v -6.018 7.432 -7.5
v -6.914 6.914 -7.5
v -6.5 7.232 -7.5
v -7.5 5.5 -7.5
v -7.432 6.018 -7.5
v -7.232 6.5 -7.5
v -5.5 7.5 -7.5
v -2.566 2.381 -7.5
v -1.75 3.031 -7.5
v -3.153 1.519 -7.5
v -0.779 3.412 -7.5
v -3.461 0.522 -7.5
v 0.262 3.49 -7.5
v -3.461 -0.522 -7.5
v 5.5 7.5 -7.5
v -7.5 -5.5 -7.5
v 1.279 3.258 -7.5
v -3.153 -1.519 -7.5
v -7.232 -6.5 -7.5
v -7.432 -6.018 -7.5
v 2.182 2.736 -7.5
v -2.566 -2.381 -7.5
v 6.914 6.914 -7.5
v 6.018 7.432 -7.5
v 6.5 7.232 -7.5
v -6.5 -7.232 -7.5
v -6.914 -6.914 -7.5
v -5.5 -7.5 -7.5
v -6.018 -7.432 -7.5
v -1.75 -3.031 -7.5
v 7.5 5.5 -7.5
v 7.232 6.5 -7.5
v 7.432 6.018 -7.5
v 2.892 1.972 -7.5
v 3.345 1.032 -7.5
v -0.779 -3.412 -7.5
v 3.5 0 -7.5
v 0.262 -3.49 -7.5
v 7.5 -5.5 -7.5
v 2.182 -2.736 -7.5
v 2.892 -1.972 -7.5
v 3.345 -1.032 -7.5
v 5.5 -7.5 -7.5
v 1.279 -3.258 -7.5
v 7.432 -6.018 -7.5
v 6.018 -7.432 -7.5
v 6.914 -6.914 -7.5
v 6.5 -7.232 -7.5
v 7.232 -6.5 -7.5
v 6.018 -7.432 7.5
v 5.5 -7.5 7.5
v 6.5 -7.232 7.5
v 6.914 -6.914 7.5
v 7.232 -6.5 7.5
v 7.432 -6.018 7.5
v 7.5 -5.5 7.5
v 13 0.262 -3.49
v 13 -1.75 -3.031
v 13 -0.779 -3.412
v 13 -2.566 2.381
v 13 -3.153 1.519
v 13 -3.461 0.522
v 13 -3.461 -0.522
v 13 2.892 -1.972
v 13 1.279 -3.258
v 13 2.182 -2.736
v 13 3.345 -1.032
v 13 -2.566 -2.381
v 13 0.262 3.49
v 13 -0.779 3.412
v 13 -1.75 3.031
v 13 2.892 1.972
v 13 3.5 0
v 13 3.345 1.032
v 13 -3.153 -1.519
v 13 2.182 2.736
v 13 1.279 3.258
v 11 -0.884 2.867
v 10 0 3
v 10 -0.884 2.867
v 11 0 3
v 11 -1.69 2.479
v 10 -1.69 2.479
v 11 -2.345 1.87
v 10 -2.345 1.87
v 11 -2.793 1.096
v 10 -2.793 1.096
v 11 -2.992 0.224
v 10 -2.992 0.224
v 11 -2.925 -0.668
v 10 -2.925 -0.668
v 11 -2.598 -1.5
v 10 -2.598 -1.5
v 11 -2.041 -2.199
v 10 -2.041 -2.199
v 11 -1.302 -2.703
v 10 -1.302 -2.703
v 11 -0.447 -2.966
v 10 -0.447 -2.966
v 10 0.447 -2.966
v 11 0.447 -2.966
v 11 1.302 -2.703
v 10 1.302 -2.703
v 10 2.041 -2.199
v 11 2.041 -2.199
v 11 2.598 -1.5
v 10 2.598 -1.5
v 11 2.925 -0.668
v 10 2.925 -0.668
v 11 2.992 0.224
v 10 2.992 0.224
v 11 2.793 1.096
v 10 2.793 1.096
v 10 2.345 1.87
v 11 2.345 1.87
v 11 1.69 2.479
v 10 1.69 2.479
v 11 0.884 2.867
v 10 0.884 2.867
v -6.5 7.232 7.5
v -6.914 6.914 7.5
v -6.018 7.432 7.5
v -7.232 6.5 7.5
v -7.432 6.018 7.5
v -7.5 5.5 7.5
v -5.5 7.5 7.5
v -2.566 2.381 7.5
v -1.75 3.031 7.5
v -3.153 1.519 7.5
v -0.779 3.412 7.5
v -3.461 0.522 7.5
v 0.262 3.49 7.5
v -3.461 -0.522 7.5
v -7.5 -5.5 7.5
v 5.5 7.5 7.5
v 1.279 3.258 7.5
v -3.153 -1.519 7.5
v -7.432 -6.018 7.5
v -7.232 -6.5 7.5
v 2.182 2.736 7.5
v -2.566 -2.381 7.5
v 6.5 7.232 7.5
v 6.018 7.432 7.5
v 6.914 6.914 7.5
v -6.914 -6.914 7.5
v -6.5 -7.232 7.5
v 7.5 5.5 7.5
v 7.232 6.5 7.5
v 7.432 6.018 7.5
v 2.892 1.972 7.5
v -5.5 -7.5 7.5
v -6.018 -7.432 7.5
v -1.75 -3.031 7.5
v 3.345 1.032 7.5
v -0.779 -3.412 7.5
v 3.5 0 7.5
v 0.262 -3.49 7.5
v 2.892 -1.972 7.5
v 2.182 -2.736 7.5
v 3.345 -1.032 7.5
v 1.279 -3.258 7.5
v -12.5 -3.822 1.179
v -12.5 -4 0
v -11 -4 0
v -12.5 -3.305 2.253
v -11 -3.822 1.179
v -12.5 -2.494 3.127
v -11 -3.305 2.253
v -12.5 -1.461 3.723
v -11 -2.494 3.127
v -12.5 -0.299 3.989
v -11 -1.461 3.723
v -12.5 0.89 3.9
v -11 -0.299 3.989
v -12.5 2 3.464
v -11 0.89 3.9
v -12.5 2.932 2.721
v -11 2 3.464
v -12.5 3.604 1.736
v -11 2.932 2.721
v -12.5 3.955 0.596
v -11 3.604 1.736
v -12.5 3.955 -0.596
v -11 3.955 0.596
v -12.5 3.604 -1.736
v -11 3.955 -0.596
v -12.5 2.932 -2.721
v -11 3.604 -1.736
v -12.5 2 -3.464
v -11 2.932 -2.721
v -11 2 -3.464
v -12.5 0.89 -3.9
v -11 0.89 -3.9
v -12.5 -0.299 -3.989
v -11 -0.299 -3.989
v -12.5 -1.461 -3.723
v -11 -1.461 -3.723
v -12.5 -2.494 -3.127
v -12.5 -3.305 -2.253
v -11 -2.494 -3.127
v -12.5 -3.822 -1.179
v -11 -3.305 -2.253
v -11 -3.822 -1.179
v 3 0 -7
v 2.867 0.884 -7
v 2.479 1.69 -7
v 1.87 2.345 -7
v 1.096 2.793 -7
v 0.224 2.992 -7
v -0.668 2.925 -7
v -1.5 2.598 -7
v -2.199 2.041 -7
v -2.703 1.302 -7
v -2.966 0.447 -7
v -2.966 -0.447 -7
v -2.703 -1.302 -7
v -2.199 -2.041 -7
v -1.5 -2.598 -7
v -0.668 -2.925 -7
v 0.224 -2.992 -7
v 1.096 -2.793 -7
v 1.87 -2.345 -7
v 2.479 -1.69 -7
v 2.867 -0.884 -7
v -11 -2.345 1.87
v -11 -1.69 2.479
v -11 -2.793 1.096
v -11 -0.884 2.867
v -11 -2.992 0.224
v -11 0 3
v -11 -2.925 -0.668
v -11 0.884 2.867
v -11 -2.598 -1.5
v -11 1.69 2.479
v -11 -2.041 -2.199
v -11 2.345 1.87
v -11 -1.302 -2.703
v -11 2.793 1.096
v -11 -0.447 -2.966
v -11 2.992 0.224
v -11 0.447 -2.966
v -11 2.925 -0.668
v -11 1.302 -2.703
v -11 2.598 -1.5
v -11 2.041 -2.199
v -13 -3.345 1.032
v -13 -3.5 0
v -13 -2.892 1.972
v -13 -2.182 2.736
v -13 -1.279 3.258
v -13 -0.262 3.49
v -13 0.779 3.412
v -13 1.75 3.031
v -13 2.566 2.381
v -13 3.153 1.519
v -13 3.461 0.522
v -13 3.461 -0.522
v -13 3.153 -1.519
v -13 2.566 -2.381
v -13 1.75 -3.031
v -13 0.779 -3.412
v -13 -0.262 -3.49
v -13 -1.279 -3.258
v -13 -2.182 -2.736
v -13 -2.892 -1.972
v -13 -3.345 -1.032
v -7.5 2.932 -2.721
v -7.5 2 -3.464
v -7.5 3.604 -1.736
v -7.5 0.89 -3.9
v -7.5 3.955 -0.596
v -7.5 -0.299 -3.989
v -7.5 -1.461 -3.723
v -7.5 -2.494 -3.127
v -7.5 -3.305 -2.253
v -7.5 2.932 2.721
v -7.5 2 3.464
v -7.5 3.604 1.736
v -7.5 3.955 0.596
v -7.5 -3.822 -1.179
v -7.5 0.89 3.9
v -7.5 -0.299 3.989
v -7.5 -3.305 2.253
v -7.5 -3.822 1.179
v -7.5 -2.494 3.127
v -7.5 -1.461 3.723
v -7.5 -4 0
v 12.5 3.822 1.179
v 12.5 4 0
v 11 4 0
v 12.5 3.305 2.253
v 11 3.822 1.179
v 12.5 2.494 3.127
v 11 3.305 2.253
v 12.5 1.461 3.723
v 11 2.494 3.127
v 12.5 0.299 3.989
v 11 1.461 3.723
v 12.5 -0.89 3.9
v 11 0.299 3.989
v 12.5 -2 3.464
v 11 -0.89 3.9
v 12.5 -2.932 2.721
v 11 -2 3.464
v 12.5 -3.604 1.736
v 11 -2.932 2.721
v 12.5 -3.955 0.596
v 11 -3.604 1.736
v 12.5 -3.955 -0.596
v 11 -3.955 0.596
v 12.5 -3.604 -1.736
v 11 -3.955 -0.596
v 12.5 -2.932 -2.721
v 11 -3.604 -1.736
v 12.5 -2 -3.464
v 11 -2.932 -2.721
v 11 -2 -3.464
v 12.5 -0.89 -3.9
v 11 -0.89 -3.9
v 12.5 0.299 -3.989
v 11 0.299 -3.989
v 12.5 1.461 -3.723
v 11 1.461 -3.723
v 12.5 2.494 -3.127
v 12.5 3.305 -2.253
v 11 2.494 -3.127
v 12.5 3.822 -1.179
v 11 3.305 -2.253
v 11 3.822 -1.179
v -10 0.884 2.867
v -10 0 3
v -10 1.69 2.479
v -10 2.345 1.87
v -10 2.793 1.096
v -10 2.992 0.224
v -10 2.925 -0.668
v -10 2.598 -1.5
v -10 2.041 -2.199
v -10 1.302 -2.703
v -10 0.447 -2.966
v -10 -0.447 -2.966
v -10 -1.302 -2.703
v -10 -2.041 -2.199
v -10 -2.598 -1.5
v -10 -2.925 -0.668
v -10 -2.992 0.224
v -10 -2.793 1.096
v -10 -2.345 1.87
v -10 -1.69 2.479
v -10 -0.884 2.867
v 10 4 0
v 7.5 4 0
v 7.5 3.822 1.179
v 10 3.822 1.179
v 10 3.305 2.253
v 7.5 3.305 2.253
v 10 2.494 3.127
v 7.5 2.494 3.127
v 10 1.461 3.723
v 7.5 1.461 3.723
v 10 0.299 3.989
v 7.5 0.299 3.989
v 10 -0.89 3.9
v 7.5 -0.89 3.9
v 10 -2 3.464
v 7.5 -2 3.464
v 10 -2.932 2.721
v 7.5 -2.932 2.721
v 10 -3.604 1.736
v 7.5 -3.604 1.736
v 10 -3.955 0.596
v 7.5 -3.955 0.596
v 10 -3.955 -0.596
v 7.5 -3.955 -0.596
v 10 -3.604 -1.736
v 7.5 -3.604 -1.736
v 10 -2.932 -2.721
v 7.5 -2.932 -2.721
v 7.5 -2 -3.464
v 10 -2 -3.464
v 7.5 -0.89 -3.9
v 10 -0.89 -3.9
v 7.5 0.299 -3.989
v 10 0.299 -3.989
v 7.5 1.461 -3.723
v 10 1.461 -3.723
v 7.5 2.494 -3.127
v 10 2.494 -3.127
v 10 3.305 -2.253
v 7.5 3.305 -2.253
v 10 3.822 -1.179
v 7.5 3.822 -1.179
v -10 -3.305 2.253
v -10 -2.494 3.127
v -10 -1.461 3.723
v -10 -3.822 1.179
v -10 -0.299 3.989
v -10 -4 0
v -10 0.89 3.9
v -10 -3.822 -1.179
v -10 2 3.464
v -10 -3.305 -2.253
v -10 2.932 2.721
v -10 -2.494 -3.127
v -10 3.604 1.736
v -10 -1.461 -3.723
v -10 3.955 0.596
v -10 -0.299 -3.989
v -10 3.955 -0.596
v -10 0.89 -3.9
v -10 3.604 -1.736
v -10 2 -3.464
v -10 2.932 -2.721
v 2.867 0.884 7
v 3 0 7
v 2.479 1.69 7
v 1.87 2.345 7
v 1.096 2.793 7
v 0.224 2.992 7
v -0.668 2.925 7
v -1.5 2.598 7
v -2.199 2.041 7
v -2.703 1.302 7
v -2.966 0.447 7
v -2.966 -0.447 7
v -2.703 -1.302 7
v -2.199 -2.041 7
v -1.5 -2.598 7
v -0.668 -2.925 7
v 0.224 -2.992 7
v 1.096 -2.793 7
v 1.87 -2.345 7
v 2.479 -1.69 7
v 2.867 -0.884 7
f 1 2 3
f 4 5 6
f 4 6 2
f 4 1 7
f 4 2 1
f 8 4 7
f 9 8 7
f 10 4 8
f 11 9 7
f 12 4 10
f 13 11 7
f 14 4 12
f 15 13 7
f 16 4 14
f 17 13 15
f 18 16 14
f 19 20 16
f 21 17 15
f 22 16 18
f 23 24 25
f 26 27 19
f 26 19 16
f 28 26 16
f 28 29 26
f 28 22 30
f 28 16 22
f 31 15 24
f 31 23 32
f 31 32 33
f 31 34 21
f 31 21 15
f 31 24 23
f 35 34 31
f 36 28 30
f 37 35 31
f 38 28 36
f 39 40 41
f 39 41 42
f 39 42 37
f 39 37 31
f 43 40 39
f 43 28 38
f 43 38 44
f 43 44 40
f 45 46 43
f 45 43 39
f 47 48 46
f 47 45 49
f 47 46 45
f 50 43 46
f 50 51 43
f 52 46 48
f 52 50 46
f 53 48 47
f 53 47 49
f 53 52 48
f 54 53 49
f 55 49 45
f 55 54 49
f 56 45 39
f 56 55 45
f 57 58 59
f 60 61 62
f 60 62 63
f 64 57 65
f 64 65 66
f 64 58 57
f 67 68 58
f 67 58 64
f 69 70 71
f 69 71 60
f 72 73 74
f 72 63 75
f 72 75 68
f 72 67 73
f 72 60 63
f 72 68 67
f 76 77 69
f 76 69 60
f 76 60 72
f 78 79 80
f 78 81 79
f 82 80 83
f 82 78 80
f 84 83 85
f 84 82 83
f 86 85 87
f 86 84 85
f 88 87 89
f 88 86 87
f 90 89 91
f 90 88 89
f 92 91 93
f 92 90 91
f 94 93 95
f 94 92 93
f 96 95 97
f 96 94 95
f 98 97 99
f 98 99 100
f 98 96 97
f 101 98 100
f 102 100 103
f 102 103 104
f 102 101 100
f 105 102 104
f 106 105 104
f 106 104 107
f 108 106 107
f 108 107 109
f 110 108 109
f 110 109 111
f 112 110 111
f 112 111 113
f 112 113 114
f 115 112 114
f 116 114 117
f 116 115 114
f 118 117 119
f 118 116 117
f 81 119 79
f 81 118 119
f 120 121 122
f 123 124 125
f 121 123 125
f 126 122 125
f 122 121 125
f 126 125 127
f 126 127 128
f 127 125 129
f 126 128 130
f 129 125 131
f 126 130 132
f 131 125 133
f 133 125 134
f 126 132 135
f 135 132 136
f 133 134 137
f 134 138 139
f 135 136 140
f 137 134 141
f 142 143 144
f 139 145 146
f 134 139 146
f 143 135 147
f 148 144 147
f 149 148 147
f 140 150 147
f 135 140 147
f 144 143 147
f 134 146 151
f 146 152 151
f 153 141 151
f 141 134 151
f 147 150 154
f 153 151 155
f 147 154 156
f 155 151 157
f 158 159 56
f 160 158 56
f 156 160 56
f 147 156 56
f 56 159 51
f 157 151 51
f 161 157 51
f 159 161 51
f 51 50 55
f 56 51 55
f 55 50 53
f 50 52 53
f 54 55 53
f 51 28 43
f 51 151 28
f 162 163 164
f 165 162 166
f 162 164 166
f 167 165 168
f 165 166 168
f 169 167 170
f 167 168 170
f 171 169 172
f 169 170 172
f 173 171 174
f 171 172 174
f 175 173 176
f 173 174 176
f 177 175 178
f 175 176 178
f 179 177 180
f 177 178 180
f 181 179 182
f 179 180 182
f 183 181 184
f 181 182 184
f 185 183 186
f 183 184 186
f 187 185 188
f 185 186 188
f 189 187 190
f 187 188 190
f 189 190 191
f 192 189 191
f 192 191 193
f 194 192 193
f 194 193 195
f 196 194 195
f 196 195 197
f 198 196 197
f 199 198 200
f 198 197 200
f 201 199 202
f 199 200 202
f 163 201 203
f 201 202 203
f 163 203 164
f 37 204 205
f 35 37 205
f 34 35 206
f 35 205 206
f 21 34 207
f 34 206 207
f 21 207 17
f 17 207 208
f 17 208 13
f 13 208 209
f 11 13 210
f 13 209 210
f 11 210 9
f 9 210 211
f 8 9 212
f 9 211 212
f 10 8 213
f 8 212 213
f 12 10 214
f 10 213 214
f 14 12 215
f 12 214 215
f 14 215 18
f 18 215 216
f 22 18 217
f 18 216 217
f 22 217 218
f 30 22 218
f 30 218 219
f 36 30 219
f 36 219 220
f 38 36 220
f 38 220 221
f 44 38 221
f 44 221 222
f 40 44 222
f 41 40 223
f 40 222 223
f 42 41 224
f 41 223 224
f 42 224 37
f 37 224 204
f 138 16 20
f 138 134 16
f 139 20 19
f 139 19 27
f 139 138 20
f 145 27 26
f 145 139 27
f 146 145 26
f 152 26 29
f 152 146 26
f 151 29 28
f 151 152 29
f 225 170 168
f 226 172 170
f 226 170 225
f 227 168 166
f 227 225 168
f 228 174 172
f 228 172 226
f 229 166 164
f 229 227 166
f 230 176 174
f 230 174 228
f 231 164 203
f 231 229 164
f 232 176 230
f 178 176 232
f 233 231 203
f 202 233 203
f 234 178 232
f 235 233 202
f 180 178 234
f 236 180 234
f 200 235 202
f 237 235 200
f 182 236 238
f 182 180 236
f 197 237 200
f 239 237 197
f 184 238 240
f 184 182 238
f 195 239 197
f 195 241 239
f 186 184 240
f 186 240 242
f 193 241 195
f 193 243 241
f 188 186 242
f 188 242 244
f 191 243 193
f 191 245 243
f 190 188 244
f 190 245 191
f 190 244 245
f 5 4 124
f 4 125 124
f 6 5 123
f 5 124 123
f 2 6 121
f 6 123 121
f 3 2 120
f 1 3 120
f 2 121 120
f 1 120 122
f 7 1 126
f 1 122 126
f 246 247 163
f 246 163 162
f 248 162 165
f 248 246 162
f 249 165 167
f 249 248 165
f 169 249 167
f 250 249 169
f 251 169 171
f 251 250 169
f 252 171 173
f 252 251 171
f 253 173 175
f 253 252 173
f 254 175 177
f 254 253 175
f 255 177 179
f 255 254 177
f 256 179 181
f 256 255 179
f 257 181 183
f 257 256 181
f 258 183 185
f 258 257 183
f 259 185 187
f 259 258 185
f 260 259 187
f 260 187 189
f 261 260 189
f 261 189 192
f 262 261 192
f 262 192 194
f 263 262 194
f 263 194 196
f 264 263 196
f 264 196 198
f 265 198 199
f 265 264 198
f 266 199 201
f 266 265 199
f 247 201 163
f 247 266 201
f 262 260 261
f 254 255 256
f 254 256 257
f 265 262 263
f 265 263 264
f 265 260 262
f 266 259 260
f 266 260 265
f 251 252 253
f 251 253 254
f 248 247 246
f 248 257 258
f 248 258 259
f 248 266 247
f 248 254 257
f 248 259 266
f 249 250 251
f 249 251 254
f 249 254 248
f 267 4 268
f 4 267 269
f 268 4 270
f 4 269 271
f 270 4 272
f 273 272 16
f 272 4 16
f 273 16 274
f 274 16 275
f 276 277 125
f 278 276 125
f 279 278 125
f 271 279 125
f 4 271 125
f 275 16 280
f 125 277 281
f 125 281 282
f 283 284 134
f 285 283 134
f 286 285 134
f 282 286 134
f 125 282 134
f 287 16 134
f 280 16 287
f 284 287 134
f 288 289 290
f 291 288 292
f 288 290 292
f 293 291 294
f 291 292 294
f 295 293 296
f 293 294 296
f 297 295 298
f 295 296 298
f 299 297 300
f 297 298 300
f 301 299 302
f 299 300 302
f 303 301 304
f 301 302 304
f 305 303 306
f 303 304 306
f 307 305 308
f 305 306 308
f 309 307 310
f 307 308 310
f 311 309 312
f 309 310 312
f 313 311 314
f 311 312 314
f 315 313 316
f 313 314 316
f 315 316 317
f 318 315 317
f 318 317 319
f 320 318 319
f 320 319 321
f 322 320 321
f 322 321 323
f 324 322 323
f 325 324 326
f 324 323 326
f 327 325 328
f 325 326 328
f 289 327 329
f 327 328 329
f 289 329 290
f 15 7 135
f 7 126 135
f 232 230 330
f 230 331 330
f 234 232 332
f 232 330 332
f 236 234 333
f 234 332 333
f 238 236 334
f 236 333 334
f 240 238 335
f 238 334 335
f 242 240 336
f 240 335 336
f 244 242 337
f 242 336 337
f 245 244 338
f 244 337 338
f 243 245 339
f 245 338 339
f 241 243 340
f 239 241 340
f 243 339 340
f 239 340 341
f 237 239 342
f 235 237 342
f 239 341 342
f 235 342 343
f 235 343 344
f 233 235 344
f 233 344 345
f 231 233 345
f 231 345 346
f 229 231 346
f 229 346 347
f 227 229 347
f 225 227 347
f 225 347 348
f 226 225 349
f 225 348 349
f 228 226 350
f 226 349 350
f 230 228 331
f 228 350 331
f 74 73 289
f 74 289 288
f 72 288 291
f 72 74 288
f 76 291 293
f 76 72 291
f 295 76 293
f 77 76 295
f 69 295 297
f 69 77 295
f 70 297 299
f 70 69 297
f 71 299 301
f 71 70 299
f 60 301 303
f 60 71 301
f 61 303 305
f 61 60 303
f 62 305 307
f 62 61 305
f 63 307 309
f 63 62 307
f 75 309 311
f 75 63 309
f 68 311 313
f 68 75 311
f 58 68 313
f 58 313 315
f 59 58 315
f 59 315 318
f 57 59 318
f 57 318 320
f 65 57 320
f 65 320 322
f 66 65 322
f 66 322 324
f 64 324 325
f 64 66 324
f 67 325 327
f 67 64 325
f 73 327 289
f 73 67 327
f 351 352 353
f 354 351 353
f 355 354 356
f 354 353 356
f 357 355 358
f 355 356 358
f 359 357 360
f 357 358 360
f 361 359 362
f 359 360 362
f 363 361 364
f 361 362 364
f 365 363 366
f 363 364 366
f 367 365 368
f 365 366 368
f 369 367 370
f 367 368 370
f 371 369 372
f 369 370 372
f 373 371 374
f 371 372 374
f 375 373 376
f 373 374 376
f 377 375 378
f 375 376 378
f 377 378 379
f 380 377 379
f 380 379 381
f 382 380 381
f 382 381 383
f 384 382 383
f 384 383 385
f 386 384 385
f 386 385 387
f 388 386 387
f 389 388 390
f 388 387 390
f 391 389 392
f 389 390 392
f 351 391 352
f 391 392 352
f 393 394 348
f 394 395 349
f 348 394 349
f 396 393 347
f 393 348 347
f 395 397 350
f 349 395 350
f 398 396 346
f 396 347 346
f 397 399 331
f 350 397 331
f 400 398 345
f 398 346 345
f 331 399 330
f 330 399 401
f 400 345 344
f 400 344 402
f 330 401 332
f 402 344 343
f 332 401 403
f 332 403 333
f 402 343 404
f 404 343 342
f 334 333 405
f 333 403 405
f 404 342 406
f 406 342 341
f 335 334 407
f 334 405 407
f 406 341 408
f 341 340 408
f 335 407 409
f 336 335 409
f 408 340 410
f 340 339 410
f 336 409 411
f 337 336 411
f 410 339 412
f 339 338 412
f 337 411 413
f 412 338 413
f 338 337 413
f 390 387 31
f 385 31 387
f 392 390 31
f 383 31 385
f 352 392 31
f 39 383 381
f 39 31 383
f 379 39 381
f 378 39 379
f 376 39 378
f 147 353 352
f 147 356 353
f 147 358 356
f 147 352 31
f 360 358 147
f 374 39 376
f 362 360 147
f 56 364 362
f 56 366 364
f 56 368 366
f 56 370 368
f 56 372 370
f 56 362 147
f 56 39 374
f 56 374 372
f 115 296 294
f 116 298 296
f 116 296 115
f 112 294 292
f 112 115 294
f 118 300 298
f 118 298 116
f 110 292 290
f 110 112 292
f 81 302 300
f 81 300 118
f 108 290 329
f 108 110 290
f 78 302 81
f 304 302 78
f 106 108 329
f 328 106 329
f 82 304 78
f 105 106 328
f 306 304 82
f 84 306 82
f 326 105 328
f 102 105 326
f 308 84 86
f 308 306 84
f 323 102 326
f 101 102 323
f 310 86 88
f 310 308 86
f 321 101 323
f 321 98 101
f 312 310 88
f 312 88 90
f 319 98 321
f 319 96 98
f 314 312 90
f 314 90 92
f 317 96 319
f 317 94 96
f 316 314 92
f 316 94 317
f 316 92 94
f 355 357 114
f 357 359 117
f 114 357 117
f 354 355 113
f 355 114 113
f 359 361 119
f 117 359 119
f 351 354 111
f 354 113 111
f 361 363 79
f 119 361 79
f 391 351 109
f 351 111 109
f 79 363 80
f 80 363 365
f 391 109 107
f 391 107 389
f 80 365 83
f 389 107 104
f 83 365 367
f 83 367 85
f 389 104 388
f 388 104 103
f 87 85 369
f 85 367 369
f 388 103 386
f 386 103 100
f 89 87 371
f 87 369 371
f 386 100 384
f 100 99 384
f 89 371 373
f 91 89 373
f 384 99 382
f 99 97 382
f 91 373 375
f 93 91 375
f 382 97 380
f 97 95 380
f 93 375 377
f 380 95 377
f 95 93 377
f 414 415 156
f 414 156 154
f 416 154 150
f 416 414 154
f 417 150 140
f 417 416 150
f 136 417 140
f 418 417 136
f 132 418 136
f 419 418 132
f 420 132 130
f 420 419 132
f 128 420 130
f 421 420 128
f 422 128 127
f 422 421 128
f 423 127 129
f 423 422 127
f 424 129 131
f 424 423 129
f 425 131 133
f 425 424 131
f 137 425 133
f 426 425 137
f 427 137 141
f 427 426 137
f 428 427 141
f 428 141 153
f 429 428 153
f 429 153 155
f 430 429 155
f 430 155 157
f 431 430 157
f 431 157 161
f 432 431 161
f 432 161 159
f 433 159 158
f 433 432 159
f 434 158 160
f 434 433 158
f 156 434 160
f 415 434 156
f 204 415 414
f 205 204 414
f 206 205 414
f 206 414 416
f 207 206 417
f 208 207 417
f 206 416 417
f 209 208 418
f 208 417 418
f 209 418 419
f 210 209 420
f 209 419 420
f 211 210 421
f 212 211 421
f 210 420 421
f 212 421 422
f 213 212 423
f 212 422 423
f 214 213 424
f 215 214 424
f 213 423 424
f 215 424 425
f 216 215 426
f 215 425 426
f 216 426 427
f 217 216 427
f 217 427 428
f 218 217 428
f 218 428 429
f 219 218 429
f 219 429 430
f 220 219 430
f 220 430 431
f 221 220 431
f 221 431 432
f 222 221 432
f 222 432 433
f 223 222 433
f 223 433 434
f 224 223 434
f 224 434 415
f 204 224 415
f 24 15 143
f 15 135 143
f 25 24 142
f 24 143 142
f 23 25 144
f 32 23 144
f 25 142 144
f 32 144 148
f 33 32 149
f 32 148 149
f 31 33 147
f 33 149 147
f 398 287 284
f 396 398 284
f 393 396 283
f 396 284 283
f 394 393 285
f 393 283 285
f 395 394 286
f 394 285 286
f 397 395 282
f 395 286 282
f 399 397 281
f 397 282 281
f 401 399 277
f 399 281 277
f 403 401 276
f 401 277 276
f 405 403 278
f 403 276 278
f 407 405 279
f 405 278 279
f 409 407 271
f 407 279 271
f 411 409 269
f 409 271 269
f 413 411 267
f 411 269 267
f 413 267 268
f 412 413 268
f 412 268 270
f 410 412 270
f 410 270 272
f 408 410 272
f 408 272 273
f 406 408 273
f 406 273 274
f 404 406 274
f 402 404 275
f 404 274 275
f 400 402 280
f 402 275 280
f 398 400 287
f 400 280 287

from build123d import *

# Parameters (mm, degrees)
F0_W     = 15
F0_H     = 15
F1_DEPTH = 7.5
F2_R     = 4
F3_DEPTH = 5.5
F4_R     = 4
F5_DEPTH = 5.5
F6_R     = 3
F7_DEPTH = 15.001
F8_W     = 1
F8_H     = 1
F10_W    = 1
F10_H    = 1
F12_SIZE = 0.5
F13_R    = 2
F14_SIZE = 0.5


with BuildPart() as f1:
    # F0 (on Front) → F1 (new body, symmetric)
    with BuildSketch(Plane.XZ):
        Rectangle(F0_W, F0_H)
    extrude(amount=F1_DEPTH, both=True)

    # F2 (on face) → F3 (join)
    with BuildSketch(Plane.YZ.offset(7.5)):
        Circle(F2_R)
    extrude(amount=F3_DEPTH)

    # F4 (on face) → F5 (join)
    with BuildSketch(Plane(origin=(-7.5, 0, 0), x_dir=(0, -1, 0), z_dir=(-1, 0, 0))):
        Circle(F4_R)
    extrude(amount=F5_DEPTH)

    # F6 (on face) → F7 (cut, through all)
    with BuildSketch(Plane.XY.offset(7.5)):
        Circle(F6_R)
    extrude(amount=-F7_DEPTH, mode=Mode.SUBTRACT)

    # F8 (on Front) → F9 (revolve, cut)
    with BuildSketch(Plane.XZ):
        with Locations((10.5, 3.5)):
            Rectangle(F8_W, F8_H)
    revolve(axis=Axis((13, 0, 0), (1, 0, 0)), mode=Mode.SUBTRACT)

    # F10 (on Front) → F11 (revolve, cut)
    with BuildSketch(Plane.XZ):
        with Locations((-10.5, 3.5)):
            Rectangle(F10_W, F10_H)
    revolve(axis=Axis((-13, 0, 0), (-1, 0, 0)), mode=Mode.SUBTRACT)

    # F12
    f12_edges = [f1.edges().sort_by_distance(p)[0] for p in [
        (13, -4, 0),
        (-13, 4, 0),
    ]]
    chamfer(f12_edges, length=F12_SIZE)

    # F13
    f13_edges = [f1.edges().sort_by_distance(p)[0] for p in [
        (-7.5, -7.5, 0),
        (-7.5, 7.5, 0),
        (7.5, 7.5, 0),
        (7.5, -7.5, 0),
    ]]
    fillet(f13_edges, radius=F13_R)

    # F14
    f14_edges = [f1.edges().sort_by_distance(p)[0] for p in [
        (-3, 0, 7.5),
        (-3, 0, -7.5),
    ]]
    chamfer(f14_edges, length=F14_SIZE)


solid = f1.part
